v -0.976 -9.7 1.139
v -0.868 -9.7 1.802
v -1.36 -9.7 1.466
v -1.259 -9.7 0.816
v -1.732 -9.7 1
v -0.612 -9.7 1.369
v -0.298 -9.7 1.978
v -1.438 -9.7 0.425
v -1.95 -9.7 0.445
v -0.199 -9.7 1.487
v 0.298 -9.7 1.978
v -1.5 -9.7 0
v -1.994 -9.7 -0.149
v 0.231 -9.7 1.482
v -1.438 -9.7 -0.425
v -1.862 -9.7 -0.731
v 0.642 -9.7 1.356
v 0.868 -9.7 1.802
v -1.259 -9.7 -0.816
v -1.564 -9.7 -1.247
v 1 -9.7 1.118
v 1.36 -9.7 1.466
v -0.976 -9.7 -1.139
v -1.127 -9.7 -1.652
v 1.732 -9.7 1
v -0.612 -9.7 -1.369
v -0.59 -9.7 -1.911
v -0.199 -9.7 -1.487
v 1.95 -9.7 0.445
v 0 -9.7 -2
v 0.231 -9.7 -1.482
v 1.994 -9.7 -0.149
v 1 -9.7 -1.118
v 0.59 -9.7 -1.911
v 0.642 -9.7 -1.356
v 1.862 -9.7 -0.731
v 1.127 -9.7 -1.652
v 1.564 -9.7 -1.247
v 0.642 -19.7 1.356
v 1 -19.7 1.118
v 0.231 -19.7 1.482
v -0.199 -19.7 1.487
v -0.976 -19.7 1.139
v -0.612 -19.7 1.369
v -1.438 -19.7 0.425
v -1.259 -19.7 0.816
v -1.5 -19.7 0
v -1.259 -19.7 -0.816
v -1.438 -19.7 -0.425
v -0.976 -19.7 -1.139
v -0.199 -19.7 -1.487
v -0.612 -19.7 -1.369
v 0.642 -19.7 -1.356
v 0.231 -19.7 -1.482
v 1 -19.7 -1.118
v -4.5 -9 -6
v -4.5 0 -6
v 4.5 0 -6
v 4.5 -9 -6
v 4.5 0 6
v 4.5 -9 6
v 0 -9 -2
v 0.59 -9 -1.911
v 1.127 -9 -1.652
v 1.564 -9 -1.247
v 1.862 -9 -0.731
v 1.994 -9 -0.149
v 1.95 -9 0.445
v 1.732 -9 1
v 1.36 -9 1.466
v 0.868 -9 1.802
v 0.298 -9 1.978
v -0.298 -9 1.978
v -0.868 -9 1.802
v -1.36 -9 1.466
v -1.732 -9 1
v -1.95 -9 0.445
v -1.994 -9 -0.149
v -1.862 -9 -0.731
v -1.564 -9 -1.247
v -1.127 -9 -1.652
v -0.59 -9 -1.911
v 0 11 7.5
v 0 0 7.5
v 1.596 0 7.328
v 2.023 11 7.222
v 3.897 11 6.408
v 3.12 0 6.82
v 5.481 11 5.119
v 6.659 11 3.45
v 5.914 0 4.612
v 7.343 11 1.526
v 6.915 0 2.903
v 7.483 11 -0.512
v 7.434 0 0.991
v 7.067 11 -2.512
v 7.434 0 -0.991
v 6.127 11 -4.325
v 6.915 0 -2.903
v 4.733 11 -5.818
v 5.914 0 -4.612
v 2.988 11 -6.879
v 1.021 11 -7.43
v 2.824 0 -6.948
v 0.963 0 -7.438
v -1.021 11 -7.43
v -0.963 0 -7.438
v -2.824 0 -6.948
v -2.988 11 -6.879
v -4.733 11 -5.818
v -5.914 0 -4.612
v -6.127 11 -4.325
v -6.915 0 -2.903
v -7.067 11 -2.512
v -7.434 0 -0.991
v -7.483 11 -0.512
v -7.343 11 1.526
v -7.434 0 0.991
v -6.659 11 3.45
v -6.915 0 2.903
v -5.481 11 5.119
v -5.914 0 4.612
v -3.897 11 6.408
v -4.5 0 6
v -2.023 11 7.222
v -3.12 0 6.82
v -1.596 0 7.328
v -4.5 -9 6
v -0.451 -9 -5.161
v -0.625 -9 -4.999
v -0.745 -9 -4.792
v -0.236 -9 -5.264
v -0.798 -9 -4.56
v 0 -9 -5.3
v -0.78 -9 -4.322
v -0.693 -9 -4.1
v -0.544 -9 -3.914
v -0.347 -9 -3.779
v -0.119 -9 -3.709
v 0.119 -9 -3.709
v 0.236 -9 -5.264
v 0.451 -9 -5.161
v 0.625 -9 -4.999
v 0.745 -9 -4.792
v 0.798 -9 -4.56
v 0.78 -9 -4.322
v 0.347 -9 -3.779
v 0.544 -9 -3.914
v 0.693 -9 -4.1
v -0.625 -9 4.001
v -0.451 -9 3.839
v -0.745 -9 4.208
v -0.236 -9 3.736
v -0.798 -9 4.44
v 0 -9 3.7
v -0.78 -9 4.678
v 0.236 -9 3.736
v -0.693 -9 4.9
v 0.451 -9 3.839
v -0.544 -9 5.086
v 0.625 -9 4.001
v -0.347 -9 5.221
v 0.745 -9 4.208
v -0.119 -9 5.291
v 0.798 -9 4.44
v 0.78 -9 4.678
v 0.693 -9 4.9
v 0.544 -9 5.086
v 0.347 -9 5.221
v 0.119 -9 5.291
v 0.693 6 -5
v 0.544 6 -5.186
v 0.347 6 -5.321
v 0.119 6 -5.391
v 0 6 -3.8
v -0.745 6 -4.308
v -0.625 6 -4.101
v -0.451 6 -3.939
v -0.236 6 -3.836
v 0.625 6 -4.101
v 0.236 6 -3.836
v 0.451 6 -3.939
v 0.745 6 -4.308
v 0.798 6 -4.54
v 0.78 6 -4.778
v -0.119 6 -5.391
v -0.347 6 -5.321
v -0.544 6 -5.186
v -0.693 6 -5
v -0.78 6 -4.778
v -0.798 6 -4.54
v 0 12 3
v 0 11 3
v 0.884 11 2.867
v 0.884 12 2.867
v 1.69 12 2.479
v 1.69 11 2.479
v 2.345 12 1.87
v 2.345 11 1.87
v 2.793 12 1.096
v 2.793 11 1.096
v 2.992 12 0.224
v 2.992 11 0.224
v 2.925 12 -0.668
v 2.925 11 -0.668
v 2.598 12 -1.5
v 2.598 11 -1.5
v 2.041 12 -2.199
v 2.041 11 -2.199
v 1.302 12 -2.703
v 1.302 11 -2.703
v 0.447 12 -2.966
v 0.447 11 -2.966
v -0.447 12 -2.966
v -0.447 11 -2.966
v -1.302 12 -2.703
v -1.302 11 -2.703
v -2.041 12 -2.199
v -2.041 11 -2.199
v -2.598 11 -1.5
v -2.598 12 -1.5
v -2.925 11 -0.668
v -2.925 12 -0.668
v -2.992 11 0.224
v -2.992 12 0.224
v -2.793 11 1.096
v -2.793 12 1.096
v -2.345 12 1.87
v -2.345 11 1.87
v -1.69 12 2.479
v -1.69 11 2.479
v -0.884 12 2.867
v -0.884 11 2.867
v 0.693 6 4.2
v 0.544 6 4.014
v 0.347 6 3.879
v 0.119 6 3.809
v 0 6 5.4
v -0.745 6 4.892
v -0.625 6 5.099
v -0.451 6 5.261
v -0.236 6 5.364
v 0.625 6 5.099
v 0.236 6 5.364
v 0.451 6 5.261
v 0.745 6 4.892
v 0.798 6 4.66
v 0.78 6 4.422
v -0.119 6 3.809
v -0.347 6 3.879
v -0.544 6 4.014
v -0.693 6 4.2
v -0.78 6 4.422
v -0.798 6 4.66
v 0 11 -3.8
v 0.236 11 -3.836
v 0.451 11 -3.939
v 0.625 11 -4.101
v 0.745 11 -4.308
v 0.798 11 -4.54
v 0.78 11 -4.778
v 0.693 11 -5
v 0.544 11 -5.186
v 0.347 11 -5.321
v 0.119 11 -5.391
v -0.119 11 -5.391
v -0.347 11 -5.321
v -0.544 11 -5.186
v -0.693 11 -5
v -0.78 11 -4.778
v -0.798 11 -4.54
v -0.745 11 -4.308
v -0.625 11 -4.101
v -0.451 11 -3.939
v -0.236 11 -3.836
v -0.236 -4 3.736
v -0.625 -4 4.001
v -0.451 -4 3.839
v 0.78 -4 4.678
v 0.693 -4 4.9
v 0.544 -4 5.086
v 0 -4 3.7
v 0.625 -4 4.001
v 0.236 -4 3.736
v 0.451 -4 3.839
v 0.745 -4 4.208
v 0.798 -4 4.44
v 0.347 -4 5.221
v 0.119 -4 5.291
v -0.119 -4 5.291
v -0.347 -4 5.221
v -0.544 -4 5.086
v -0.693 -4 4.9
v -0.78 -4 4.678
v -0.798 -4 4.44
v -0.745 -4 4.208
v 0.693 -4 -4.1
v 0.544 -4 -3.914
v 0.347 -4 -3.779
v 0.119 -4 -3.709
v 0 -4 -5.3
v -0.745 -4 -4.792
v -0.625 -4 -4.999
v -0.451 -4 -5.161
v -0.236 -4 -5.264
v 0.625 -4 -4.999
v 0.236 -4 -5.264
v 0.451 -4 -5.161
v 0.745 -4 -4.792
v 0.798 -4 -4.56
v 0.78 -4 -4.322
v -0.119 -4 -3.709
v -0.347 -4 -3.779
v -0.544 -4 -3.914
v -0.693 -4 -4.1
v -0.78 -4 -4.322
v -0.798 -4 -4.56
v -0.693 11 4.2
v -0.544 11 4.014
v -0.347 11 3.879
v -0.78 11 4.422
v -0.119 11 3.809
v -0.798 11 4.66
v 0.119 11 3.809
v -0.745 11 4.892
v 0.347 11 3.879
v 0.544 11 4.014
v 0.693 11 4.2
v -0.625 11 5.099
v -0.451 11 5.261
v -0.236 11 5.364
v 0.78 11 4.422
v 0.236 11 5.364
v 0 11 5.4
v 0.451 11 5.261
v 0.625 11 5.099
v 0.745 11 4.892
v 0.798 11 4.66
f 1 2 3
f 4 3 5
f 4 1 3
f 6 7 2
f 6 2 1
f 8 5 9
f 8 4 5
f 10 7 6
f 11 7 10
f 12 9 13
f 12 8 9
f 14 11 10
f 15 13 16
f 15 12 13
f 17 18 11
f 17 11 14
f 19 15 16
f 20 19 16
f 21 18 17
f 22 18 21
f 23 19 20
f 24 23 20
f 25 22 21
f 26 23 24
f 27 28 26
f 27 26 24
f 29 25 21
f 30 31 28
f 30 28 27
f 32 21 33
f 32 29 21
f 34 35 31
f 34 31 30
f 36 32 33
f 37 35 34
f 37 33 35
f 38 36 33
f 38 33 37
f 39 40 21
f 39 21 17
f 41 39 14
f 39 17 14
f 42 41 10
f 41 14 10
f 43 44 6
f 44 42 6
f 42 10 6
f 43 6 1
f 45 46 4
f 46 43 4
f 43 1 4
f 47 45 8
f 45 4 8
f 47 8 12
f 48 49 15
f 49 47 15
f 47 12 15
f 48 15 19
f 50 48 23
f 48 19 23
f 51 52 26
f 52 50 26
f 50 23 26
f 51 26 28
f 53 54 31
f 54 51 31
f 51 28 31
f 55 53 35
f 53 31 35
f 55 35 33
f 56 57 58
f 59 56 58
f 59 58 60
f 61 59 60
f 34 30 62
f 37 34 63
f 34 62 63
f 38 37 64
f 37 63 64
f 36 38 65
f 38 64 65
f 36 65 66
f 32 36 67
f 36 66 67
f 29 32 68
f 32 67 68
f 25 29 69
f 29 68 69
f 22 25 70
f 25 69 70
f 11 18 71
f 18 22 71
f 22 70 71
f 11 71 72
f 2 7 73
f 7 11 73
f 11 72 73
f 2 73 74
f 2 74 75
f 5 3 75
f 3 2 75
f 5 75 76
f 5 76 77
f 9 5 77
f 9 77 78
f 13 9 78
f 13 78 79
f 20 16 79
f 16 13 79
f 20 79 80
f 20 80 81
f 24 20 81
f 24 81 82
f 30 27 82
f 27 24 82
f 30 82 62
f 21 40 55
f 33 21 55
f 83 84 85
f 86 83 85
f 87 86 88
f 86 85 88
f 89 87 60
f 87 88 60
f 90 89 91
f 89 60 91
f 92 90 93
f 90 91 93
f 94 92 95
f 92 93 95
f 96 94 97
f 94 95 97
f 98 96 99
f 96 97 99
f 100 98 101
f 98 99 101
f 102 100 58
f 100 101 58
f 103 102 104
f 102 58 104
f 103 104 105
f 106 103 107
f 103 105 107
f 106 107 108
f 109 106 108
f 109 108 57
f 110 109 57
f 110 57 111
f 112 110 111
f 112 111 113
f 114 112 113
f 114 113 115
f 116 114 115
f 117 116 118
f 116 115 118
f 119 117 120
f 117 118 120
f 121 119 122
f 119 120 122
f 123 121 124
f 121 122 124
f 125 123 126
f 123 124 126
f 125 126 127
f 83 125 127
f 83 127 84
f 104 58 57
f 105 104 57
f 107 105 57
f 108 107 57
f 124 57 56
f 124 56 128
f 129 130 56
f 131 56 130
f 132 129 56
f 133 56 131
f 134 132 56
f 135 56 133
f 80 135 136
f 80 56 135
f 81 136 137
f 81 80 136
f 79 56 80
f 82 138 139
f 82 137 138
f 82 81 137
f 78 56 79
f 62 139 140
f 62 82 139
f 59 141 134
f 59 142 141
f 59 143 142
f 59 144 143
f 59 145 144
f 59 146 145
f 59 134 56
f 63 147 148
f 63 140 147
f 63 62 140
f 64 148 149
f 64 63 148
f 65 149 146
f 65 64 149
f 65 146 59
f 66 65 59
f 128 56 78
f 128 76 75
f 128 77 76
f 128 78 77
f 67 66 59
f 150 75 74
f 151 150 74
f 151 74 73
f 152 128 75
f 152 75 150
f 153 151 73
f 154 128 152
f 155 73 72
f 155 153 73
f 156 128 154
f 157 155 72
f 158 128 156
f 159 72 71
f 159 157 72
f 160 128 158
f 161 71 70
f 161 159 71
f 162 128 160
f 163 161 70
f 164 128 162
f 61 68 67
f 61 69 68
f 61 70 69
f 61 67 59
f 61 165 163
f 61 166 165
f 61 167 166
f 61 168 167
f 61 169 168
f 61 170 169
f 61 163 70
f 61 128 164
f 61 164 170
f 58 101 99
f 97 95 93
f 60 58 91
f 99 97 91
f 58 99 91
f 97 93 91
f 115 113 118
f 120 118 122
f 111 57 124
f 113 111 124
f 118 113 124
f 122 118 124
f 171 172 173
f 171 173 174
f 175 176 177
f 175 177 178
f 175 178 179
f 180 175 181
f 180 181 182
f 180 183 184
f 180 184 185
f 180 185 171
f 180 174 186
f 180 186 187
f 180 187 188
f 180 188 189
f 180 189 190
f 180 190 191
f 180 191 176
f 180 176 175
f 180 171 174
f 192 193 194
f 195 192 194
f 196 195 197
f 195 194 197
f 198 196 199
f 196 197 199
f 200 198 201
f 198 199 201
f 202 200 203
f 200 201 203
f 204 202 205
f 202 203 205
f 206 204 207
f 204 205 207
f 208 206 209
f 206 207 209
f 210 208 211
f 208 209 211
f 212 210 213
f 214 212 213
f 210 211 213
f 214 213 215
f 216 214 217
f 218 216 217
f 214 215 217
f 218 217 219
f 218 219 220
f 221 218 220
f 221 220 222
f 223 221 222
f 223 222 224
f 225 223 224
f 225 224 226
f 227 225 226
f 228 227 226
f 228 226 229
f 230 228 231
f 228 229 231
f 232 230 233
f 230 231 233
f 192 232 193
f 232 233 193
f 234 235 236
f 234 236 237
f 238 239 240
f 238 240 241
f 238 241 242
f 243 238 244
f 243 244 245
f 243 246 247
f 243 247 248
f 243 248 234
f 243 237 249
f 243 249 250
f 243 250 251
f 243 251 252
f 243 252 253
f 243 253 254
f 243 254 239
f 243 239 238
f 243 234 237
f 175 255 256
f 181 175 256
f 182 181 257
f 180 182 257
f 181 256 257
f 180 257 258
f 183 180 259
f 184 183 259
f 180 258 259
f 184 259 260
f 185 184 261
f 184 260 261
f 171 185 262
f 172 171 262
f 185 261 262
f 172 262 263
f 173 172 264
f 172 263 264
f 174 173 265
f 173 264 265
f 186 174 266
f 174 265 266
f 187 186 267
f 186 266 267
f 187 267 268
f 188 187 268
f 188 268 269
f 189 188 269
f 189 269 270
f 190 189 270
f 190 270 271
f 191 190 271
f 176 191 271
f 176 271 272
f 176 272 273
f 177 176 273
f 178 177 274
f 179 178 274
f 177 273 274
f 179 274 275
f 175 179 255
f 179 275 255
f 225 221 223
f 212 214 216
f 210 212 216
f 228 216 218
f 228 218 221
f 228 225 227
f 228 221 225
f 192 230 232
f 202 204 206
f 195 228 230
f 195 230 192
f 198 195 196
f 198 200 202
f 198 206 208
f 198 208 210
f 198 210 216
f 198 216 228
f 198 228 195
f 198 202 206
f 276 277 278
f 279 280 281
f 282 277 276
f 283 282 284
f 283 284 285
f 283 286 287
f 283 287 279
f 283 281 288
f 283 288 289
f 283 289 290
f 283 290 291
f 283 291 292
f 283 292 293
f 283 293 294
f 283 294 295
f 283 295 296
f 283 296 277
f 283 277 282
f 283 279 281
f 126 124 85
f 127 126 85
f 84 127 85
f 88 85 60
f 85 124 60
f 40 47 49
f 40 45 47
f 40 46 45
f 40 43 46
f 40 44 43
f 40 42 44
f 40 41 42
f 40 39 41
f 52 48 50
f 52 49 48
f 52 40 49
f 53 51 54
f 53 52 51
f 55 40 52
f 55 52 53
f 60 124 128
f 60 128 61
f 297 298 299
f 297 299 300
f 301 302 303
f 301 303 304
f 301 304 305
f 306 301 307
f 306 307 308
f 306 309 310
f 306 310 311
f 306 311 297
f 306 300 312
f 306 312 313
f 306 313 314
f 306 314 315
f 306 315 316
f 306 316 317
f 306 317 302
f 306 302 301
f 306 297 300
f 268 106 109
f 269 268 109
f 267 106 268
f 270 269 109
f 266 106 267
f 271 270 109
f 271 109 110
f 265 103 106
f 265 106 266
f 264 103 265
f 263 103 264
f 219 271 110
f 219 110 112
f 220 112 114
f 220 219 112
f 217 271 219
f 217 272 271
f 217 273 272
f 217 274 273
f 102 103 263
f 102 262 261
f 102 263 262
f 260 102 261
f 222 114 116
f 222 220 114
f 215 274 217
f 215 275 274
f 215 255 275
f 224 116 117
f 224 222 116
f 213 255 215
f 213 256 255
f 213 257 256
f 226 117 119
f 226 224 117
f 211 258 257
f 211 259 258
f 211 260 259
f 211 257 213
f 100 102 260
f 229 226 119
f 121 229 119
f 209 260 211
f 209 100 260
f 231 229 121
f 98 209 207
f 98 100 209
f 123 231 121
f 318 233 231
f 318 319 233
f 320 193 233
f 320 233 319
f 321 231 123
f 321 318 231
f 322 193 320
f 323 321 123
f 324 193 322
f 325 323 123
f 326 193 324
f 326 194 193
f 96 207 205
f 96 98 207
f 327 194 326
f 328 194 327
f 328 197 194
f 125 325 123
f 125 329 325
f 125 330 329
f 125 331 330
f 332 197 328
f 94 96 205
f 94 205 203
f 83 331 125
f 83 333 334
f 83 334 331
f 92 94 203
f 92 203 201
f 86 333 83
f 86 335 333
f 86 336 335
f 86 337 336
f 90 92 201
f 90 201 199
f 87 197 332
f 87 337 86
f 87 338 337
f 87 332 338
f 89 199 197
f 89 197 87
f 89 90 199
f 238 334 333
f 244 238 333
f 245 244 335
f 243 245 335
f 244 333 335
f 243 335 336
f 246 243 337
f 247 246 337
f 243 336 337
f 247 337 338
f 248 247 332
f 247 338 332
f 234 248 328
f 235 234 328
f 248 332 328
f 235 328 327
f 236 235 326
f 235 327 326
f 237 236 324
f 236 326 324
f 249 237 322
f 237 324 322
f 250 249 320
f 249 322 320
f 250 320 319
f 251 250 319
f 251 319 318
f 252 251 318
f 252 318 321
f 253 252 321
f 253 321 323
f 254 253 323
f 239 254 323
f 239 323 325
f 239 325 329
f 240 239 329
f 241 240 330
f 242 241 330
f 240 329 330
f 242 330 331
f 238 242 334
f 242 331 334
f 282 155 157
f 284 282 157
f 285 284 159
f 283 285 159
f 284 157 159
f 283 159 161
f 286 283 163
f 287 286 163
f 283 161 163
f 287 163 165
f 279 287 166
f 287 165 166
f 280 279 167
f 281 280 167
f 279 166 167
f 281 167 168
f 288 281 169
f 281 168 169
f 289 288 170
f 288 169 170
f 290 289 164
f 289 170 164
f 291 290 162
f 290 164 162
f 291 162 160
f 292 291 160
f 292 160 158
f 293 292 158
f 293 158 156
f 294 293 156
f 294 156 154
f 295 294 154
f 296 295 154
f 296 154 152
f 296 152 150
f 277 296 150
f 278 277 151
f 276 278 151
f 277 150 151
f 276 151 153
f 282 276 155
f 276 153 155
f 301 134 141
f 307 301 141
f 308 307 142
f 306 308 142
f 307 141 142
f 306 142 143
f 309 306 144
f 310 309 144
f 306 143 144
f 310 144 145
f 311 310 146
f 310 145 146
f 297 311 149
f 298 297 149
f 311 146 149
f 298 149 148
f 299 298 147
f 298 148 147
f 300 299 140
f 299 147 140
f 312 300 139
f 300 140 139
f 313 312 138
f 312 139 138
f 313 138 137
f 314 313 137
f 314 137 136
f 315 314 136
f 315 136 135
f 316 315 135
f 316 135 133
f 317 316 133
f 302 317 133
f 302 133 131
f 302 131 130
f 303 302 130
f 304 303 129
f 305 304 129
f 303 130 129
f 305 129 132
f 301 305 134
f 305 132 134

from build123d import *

# Parameters (mm, degrees)
SKETCH1_R           = 7.5
BOSS_EXTRUDE1_DEPTH = 11
SKETCH2_R           = 3
BOSS_EXTRUDE2_DEPTH = 1
SKETCH3_W           = 9
SKETCH3_H           = 12
BOSS_EXTRUDE3_DEPTH = 9
SKETCH4_R           = 2
BOSS_EXTRUDE4_DEPTH = 0.7
SKETCH5_R           = 1.5
BOSS_EXTRUDE5_DEPTH = 10
CUT_EXTRUDE1_DEPTH  = 10
SKETCH7_R           = 0.8
CUT_EXTRUDE2_DEPTH  = 5
SKETCH8_R           = 0.8
CUT_EXTRUDE3_DEPTH  = 5


with BuildPart() as part:
    # Sketch1 → Boss-Extrude1 (new body)
    with BuildSketch(Plane(origin=(0, 0, 0), x_dir=(1, 0, 0), z_dir=(0, 1, 0))):
        with Locations(Location((0, 0, 0), (0, 0, 270))):
            Circle(SKETCH1_R)
    extrude(amount=BOSS_EXTRUDE1_DEPTH)

    # Sketch2 → Boss-Extrude2 (add)
    with BuildSketch(Plane(origin=(0, 11, 0), x_dir=(1, 0, 0), z_dir=(0, 1, 0))):
        with Locations(Location((0, 0, 0), (0, 0, 270))):
            Circle(SKETCH2_R)
    extrude(amount=BOSS_EXTRUDE2_DEPTH)

    # Sketch3 → Boss-Extrude3 (add)
    with BuildSketch(Plane.XZ):
        Rectangle(SKETCH3_W, SKETCH3_H)
    extrude(amount=BOSS_EXTRUDE3_DEPTH)

    # Sketch4 → Boss-Extrude4 (add)
    with BuildSketch(Plane.XZ.offset(9)):
        with Locations(Location((0, 0, 0), (0, 0, 270))):
            Circle(SKETCH4_R)
    extrude(amount=BOSS_EXTRUDE4_DEPTH)

    # Sketch5 → Boss-Extrude5 (add)
    with BuildSketch(Plane.XZ.offset(9.7)):
        with Locations(Location((0, 0, 0), (0, 0, 270))):
            Circle(SKETCH5_R)
    extrude(amount=BOSS_EXTRUDE5_DEPTH)

    # Sketch6 → Cut-Extrude1 (cut)
    with BuildSketch(Plane.XZ.offset(19.7)):
        Polygon((1, 35.32716531), (1, 1.118033989), (1, -1.118033989), (1, -35.32716531), (69.418262642, -35.32716531), (69.418262642, 35.32716531), align=None)
    extrude(amount=-CUT_EXTRUDE1_DEPTH, mode=Mode.SUBTRACT)

    # Sketch7 → Cut-Extrude2 (cut)
    with BuildSketch(Plane.XZ.offset(9)):
        with Locations(Location((0, 4.5, 0), (0, 0, 270))):
            Circle(SKETCH7_R)
        with Locations(Location((0, -4.5, 0), (0, 0, 270))):
            Circle(SKETCH7_R)
    extrude(amount=-CUT_EXTRUDE2_DEPTH, mode=Mode.SUBTRACT)

    # Sketch8 → Cut-Extrude3 (cut)
    with BuildSketch(Plane(origin=(0, 11, 0), x_dir=(1, 0, 0), z_dir=(0, 1, 0))):
        with Locations(Location((0, 4.6, 0), (0, 0, 270))):
            Circle(SKETCH8_R)
        with Locations(Location((0, -4.6, 0), (0, 0, 270))):
            Circle(SKETCH8_R)
    extrude(amount=-CUT_EXTRUDE3_DEPTH, mode=Mode.SUBTRACT)


solid = part.part
